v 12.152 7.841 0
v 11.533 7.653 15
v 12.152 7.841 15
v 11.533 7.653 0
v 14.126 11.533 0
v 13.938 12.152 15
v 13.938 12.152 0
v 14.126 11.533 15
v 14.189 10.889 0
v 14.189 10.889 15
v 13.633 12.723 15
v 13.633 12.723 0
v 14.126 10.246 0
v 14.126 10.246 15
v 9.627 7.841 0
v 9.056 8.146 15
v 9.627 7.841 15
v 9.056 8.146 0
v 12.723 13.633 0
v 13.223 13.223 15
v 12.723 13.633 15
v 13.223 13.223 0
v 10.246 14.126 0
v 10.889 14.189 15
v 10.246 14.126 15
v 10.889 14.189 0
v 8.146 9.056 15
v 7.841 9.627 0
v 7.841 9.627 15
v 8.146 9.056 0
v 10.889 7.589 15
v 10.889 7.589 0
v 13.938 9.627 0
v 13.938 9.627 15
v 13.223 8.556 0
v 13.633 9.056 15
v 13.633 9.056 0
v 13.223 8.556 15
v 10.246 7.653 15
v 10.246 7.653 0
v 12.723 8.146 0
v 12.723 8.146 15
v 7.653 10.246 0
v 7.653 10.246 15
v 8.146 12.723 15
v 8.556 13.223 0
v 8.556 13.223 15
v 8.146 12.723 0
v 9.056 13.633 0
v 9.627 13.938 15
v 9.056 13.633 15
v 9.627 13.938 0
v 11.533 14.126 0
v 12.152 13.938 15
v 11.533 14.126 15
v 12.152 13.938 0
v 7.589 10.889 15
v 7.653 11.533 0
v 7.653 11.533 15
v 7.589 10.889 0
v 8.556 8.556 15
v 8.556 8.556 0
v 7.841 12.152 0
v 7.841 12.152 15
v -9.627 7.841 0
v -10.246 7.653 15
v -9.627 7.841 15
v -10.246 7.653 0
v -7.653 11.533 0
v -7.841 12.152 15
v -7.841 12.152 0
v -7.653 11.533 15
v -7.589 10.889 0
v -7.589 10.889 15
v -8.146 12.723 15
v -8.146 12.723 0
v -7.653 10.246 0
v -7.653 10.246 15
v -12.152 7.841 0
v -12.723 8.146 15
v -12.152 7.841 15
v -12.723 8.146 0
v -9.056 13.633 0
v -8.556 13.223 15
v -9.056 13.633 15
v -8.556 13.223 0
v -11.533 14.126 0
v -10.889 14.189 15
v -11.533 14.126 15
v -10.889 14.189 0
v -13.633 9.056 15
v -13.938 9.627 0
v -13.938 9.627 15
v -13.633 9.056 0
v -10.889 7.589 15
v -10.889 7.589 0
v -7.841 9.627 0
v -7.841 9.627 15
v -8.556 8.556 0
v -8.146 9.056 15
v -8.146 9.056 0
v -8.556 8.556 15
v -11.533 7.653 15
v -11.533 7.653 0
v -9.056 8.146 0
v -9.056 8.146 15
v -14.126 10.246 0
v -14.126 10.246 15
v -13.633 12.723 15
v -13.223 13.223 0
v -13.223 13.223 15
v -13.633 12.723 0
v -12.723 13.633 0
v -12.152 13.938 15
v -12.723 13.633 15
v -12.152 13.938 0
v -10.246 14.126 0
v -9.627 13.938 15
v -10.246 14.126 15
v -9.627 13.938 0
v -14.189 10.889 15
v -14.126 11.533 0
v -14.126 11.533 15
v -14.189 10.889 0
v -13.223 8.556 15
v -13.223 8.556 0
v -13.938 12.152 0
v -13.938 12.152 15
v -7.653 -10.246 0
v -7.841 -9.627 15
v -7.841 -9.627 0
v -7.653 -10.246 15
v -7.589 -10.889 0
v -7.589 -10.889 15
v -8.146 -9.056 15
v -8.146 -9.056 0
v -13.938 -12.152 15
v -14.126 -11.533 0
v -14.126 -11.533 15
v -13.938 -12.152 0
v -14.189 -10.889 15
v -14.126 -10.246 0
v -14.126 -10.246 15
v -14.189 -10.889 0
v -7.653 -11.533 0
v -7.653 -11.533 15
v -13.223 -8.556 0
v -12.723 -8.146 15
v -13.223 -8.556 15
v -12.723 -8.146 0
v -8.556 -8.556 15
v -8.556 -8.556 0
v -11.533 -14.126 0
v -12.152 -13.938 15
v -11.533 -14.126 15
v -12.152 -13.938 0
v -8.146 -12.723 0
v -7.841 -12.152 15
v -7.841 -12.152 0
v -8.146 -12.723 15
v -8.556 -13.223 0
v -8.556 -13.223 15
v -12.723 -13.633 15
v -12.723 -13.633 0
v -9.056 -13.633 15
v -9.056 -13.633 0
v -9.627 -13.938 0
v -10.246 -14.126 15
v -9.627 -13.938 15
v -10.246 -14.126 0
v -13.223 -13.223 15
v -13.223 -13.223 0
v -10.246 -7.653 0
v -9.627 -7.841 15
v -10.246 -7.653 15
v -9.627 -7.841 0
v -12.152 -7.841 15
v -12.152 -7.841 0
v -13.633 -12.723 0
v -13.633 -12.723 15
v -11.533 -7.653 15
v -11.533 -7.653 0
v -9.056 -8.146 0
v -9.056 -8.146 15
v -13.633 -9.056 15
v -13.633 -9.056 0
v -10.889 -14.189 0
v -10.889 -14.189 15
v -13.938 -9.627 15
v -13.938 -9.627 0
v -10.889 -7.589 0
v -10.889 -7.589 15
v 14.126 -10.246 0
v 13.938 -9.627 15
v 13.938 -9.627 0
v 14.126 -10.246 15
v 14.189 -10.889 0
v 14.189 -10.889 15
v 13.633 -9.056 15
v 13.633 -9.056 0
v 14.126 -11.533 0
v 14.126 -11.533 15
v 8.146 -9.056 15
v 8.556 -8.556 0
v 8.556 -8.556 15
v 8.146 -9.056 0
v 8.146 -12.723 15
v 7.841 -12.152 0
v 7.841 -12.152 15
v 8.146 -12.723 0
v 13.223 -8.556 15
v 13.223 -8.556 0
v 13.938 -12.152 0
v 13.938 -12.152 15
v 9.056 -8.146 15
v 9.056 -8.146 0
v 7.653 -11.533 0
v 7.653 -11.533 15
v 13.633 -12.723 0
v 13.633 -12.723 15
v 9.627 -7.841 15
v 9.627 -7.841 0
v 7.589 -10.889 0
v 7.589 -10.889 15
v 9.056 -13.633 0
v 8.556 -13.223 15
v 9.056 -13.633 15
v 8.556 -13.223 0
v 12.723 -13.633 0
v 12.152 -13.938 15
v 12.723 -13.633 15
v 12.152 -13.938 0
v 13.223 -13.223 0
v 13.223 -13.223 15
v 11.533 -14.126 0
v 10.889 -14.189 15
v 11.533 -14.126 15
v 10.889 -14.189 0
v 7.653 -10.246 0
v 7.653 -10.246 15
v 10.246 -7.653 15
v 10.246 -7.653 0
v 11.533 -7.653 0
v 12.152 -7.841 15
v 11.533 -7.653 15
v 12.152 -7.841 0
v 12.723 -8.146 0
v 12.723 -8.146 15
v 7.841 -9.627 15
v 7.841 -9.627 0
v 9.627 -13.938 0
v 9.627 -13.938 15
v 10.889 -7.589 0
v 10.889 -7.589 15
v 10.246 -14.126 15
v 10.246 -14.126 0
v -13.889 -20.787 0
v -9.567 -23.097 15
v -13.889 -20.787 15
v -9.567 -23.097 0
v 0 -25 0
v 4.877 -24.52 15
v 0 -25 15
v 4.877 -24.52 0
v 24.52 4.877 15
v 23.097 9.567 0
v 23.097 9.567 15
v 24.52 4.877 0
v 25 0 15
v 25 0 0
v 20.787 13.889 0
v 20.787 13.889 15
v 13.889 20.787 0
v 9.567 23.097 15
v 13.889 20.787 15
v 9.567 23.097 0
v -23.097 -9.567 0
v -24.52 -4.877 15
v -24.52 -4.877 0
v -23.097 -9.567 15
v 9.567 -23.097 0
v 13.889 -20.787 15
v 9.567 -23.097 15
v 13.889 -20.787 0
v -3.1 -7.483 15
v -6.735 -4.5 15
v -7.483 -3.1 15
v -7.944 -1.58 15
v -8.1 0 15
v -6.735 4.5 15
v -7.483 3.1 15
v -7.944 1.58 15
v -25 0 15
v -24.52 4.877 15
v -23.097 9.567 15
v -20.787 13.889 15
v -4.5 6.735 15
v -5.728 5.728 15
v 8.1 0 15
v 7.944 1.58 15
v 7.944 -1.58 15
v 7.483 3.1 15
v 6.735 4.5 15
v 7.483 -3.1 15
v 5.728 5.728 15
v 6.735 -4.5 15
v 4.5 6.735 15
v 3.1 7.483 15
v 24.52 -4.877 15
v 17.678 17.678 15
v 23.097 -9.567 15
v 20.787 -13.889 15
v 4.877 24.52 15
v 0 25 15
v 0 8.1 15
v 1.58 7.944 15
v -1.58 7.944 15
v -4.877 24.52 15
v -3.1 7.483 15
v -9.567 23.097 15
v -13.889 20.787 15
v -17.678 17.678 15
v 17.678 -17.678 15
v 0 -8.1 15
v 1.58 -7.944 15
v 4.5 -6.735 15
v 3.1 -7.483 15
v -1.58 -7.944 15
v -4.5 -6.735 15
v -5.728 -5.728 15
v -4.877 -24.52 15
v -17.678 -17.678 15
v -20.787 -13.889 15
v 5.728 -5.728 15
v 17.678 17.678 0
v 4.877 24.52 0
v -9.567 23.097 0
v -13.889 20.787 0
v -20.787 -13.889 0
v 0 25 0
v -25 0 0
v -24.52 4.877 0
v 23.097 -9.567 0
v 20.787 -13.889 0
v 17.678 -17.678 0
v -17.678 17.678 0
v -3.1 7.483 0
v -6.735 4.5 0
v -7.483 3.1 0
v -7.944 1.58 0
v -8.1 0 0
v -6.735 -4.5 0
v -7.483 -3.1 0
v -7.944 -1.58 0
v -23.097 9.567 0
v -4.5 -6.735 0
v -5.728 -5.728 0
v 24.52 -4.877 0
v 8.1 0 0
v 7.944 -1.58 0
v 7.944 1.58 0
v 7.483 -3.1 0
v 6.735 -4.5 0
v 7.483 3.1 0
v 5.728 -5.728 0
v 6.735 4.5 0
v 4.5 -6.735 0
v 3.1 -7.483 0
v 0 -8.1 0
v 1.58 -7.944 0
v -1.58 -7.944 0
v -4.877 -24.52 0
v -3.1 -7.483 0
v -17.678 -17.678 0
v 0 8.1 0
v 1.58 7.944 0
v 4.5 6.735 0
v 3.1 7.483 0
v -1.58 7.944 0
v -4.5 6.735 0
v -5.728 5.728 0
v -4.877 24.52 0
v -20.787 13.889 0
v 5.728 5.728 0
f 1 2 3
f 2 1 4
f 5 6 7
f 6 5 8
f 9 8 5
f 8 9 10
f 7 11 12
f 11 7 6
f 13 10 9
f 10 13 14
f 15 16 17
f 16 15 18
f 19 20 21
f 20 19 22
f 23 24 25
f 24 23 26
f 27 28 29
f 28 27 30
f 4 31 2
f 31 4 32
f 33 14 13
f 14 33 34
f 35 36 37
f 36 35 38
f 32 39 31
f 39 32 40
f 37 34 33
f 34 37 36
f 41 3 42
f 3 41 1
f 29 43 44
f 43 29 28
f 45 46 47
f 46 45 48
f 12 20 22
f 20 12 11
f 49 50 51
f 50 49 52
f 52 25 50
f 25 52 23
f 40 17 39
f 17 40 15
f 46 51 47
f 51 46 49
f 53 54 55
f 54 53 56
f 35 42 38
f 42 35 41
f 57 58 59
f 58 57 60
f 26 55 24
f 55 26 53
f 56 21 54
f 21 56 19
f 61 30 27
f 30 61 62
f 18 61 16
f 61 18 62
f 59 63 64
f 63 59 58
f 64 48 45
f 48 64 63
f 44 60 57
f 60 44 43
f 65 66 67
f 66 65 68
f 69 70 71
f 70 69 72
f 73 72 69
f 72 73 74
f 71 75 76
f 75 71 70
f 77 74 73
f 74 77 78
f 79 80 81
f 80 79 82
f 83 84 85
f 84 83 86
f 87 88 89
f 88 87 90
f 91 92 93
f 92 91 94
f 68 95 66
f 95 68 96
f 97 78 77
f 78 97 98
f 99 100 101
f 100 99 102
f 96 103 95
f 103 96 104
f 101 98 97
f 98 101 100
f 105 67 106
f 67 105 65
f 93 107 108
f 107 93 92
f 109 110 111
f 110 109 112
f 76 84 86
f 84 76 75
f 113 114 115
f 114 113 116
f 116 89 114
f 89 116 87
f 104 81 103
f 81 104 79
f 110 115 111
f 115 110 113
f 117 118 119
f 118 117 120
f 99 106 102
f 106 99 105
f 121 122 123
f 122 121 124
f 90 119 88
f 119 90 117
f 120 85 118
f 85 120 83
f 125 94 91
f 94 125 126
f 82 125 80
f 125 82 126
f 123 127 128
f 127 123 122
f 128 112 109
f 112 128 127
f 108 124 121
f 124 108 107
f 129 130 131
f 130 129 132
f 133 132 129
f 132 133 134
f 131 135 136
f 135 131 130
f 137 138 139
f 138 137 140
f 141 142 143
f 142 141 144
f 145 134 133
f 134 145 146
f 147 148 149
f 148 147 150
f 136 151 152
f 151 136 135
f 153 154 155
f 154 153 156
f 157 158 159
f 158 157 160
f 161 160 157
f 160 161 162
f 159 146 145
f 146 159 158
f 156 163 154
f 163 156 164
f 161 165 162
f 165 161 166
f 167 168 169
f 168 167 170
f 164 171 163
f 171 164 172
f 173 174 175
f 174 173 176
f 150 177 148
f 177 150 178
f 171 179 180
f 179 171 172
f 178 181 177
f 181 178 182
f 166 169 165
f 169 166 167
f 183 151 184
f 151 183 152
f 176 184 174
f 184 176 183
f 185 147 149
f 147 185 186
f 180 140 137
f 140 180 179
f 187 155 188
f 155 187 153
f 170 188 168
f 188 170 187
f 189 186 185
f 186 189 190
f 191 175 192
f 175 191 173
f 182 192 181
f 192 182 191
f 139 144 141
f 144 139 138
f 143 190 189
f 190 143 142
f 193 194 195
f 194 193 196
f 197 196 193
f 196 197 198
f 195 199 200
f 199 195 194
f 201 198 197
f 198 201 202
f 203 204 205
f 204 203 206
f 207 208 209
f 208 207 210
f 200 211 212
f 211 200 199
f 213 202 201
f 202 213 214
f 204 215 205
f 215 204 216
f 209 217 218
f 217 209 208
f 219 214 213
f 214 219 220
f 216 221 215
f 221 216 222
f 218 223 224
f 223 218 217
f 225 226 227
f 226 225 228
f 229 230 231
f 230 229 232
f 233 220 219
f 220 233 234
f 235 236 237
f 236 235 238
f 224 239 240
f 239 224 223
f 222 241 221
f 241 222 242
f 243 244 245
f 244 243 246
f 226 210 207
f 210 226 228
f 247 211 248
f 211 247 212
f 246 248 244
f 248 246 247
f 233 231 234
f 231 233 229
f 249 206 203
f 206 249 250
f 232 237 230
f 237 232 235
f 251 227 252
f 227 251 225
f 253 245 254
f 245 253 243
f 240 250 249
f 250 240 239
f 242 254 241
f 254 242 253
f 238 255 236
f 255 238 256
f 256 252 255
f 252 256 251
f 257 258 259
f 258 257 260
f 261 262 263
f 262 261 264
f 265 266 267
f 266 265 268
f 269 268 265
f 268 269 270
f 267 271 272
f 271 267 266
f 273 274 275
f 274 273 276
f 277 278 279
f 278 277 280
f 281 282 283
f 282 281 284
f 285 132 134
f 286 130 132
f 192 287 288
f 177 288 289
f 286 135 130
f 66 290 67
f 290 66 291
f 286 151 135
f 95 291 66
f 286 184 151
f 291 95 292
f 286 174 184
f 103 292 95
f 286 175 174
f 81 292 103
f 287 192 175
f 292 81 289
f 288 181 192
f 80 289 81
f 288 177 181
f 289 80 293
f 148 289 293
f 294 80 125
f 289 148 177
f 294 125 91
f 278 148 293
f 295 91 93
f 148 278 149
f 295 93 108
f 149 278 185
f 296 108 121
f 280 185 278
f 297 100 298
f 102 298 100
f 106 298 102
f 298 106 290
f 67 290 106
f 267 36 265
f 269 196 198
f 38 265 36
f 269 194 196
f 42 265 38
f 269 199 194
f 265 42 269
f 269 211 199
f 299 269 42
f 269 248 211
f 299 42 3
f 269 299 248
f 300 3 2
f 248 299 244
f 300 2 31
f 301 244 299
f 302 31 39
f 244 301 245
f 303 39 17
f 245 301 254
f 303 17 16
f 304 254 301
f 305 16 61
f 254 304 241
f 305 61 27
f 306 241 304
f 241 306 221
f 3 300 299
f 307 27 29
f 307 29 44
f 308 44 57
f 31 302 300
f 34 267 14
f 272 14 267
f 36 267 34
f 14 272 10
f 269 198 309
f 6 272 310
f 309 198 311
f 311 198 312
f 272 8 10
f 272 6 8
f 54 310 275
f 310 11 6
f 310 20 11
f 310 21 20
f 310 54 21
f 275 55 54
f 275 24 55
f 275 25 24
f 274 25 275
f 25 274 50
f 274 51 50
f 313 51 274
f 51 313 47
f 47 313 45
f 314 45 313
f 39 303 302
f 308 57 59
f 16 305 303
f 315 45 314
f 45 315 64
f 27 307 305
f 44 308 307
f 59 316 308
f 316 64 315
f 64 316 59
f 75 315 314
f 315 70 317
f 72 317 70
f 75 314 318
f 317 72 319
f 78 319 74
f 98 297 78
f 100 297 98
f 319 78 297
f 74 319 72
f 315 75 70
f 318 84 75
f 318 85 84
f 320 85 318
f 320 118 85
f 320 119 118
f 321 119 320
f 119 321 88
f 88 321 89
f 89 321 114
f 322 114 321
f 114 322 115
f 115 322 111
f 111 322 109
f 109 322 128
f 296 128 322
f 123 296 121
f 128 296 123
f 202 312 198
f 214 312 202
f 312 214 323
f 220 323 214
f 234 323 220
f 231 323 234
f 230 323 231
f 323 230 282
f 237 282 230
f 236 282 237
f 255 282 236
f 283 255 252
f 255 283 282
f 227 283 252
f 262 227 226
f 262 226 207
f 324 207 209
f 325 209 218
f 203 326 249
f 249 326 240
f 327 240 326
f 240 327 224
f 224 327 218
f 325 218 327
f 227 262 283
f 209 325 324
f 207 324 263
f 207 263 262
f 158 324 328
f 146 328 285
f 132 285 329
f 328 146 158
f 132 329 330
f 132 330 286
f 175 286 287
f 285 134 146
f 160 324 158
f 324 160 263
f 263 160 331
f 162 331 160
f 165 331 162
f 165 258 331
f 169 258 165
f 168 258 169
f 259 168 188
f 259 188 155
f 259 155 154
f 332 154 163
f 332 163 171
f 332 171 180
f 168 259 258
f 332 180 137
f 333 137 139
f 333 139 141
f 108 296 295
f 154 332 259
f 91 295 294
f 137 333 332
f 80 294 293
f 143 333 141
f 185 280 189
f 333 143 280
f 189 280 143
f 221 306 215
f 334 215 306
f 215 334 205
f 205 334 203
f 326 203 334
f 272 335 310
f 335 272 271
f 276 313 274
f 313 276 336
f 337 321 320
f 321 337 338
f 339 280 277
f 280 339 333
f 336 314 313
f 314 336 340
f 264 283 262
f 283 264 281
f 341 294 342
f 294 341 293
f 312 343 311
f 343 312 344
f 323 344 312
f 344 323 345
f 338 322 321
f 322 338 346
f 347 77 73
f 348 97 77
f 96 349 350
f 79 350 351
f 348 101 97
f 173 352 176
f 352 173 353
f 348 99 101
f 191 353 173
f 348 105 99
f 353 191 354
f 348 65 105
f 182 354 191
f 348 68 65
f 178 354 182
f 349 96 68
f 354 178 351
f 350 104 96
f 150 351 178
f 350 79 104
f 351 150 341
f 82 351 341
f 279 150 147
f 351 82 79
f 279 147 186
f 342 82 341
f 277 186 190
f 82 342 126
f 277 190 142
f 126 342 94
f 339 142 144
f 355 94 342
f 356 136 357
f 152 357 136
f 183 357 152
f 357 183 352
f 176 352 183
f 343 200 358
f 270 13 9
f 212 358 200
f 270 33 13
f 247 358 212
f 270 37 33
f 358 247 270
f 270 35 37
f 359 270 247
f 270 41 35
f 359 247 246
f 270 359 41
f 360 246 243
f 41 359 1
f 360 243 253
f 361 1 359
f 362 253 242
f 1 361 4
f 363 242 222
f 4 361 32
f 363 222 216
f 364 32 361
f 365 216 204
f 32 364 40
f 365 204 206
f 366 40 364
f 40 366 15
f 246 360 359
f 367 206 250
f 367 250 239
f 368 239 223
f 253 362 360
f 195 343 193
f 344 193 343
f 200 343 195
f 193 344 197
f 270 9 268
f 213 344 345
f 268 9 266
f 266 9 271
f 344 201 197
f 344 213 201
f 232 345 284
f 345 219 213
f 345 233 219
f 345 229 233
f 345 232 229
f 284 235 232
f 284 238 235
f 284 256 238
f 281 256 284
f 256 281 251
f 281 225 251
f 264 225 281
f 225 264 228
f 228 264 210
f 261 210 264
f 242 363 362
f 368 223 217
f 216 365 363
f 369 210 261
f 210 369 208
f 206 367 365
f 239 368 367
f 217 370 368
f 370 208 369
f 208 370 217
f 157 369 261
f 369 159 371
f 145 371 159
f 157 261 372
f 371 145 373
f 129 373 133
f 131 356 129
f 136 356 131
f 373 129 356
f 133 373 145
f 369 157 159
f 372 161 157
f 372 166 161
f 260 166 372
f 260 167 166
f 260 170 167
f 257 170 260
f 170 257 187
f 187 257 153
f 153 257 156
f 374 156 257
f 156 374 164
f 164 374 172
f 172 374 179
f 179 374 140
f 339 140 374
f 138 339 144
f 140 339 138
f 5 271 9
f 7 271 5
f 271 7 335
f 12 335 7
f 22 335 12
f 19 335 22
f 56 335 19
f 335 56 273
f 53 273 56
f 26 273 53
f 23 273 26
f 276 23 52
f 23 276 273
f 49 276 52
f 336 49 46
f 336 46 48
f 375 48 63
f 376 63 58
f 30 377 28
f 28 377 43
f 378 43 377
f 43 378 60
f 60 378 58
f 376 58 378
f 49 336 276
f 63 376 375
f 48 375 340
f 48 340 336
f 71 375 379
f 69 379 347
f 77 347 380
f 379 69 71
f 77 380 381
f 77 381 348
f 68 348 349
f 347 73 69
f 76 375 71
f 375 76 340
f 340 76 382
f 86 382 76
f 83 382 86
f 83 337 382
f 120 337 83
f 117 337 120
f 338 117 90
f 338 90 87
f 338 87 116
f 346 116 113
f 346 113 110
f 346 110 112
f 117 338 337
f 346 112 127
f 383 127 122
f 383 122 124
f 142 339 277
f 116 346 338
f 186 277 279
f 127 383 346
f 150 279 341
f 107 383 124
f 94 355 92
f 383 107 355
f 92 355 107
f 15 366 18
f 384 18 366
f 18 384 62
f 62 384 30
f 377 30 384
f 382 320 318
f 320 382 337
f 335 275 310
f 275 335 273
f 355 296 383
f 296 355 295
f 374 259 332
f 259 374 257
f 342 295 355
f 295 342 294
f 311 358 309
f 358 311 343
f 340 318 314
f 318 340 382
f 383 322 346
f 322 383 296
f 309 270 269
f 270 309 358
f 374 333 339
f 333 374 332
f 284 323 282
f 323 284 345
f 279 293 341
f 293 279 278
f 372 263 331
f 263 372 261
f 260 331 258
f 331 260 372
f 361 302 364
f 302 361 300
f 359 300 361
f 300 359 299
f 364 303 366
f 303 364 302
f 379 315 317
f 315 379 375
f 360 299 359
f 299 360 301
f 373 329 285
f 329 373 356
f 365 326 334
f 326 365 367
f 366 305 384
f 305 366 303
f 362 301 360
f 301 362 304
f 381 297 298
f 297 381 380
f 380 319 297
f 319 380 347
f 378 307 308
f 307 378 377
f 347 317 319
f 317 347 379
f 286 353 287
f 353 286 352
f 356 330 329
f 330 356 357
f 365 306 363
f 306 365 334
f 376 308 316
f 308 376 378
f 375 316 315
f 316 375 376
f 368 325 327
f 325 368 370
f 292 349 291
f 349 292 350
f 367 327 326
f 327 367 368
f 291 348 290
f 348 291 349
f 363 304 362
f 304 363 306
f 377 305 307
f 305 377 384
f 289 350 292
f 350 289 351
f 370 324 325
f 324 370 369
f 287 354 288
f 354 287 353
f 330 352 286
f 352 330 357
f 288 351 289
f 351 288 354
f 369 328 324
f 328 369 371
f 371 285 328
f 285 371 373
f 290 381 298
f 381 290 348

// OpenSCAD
$fn = 32;

// ----------------------------------------------------------------------
// Flange Ø50 x 15
// 4 holes on a Ø30.8 bolt circle, bolted joints
// ----------------------------------------------------------------------

// --- parameters (mm) ---
flange_d = 50;   // outside diameter of the flange
thickness = 15;  // flange thickness
holes = 4;       // number of bolt holes
pcd = 30.8;      // bolt circle diameter
start_deg = 45;  // angle of the first hole, from +X
hole_d = 6.6;    // bolt hole diameter
bore_d = 16.2;   // central through bore
hub_d = 26.2;    // hub outside diameter
hub_h = 0;       // hub height above the flange face (0 = no hub)

// --- derived feature positions (mm) ---
height = thickness + hub_h;  // = 15   overall height of the part
pcd_r = pcd / 2;             // = 15.4   bolt circle radius
hole_step = 360 / holes;     // = 90   angular pitch
feature_centers = [
  [pcd_r * cos(start_deg + 0 * hole_step), pcd_r * sin(start_deg + 0 * hole_step)],
  [pcd_r * cos(start_deg + 1 * hole_step), pcd_r * sin(start_deg + 1 * hole_step)],
  [pcd_r * cos(start_deg + 2 * hole_step), pcd_r * sin(start_deg + 2 * hole_step)],
  [pcd_r * cos(start_deg + 3 * hole_step), pcd_r * sin(start_deg + 3 * hole_step)]
];   // bolt hole centres on the pitch circle

// flange disc, every hole and the bore cut straight through
difference() {
  union() {
    cylinder(d = flange_d, h = thickness);
  }
  translate([0, 0, -1]) cylinder(d = bore_d, h = height + 2);  // bore, through
  for (centre = feature_centers)
    translate([centre[0], centre[1], -1]) cylinder(d = hole_d, h = thickness + 2);
}
